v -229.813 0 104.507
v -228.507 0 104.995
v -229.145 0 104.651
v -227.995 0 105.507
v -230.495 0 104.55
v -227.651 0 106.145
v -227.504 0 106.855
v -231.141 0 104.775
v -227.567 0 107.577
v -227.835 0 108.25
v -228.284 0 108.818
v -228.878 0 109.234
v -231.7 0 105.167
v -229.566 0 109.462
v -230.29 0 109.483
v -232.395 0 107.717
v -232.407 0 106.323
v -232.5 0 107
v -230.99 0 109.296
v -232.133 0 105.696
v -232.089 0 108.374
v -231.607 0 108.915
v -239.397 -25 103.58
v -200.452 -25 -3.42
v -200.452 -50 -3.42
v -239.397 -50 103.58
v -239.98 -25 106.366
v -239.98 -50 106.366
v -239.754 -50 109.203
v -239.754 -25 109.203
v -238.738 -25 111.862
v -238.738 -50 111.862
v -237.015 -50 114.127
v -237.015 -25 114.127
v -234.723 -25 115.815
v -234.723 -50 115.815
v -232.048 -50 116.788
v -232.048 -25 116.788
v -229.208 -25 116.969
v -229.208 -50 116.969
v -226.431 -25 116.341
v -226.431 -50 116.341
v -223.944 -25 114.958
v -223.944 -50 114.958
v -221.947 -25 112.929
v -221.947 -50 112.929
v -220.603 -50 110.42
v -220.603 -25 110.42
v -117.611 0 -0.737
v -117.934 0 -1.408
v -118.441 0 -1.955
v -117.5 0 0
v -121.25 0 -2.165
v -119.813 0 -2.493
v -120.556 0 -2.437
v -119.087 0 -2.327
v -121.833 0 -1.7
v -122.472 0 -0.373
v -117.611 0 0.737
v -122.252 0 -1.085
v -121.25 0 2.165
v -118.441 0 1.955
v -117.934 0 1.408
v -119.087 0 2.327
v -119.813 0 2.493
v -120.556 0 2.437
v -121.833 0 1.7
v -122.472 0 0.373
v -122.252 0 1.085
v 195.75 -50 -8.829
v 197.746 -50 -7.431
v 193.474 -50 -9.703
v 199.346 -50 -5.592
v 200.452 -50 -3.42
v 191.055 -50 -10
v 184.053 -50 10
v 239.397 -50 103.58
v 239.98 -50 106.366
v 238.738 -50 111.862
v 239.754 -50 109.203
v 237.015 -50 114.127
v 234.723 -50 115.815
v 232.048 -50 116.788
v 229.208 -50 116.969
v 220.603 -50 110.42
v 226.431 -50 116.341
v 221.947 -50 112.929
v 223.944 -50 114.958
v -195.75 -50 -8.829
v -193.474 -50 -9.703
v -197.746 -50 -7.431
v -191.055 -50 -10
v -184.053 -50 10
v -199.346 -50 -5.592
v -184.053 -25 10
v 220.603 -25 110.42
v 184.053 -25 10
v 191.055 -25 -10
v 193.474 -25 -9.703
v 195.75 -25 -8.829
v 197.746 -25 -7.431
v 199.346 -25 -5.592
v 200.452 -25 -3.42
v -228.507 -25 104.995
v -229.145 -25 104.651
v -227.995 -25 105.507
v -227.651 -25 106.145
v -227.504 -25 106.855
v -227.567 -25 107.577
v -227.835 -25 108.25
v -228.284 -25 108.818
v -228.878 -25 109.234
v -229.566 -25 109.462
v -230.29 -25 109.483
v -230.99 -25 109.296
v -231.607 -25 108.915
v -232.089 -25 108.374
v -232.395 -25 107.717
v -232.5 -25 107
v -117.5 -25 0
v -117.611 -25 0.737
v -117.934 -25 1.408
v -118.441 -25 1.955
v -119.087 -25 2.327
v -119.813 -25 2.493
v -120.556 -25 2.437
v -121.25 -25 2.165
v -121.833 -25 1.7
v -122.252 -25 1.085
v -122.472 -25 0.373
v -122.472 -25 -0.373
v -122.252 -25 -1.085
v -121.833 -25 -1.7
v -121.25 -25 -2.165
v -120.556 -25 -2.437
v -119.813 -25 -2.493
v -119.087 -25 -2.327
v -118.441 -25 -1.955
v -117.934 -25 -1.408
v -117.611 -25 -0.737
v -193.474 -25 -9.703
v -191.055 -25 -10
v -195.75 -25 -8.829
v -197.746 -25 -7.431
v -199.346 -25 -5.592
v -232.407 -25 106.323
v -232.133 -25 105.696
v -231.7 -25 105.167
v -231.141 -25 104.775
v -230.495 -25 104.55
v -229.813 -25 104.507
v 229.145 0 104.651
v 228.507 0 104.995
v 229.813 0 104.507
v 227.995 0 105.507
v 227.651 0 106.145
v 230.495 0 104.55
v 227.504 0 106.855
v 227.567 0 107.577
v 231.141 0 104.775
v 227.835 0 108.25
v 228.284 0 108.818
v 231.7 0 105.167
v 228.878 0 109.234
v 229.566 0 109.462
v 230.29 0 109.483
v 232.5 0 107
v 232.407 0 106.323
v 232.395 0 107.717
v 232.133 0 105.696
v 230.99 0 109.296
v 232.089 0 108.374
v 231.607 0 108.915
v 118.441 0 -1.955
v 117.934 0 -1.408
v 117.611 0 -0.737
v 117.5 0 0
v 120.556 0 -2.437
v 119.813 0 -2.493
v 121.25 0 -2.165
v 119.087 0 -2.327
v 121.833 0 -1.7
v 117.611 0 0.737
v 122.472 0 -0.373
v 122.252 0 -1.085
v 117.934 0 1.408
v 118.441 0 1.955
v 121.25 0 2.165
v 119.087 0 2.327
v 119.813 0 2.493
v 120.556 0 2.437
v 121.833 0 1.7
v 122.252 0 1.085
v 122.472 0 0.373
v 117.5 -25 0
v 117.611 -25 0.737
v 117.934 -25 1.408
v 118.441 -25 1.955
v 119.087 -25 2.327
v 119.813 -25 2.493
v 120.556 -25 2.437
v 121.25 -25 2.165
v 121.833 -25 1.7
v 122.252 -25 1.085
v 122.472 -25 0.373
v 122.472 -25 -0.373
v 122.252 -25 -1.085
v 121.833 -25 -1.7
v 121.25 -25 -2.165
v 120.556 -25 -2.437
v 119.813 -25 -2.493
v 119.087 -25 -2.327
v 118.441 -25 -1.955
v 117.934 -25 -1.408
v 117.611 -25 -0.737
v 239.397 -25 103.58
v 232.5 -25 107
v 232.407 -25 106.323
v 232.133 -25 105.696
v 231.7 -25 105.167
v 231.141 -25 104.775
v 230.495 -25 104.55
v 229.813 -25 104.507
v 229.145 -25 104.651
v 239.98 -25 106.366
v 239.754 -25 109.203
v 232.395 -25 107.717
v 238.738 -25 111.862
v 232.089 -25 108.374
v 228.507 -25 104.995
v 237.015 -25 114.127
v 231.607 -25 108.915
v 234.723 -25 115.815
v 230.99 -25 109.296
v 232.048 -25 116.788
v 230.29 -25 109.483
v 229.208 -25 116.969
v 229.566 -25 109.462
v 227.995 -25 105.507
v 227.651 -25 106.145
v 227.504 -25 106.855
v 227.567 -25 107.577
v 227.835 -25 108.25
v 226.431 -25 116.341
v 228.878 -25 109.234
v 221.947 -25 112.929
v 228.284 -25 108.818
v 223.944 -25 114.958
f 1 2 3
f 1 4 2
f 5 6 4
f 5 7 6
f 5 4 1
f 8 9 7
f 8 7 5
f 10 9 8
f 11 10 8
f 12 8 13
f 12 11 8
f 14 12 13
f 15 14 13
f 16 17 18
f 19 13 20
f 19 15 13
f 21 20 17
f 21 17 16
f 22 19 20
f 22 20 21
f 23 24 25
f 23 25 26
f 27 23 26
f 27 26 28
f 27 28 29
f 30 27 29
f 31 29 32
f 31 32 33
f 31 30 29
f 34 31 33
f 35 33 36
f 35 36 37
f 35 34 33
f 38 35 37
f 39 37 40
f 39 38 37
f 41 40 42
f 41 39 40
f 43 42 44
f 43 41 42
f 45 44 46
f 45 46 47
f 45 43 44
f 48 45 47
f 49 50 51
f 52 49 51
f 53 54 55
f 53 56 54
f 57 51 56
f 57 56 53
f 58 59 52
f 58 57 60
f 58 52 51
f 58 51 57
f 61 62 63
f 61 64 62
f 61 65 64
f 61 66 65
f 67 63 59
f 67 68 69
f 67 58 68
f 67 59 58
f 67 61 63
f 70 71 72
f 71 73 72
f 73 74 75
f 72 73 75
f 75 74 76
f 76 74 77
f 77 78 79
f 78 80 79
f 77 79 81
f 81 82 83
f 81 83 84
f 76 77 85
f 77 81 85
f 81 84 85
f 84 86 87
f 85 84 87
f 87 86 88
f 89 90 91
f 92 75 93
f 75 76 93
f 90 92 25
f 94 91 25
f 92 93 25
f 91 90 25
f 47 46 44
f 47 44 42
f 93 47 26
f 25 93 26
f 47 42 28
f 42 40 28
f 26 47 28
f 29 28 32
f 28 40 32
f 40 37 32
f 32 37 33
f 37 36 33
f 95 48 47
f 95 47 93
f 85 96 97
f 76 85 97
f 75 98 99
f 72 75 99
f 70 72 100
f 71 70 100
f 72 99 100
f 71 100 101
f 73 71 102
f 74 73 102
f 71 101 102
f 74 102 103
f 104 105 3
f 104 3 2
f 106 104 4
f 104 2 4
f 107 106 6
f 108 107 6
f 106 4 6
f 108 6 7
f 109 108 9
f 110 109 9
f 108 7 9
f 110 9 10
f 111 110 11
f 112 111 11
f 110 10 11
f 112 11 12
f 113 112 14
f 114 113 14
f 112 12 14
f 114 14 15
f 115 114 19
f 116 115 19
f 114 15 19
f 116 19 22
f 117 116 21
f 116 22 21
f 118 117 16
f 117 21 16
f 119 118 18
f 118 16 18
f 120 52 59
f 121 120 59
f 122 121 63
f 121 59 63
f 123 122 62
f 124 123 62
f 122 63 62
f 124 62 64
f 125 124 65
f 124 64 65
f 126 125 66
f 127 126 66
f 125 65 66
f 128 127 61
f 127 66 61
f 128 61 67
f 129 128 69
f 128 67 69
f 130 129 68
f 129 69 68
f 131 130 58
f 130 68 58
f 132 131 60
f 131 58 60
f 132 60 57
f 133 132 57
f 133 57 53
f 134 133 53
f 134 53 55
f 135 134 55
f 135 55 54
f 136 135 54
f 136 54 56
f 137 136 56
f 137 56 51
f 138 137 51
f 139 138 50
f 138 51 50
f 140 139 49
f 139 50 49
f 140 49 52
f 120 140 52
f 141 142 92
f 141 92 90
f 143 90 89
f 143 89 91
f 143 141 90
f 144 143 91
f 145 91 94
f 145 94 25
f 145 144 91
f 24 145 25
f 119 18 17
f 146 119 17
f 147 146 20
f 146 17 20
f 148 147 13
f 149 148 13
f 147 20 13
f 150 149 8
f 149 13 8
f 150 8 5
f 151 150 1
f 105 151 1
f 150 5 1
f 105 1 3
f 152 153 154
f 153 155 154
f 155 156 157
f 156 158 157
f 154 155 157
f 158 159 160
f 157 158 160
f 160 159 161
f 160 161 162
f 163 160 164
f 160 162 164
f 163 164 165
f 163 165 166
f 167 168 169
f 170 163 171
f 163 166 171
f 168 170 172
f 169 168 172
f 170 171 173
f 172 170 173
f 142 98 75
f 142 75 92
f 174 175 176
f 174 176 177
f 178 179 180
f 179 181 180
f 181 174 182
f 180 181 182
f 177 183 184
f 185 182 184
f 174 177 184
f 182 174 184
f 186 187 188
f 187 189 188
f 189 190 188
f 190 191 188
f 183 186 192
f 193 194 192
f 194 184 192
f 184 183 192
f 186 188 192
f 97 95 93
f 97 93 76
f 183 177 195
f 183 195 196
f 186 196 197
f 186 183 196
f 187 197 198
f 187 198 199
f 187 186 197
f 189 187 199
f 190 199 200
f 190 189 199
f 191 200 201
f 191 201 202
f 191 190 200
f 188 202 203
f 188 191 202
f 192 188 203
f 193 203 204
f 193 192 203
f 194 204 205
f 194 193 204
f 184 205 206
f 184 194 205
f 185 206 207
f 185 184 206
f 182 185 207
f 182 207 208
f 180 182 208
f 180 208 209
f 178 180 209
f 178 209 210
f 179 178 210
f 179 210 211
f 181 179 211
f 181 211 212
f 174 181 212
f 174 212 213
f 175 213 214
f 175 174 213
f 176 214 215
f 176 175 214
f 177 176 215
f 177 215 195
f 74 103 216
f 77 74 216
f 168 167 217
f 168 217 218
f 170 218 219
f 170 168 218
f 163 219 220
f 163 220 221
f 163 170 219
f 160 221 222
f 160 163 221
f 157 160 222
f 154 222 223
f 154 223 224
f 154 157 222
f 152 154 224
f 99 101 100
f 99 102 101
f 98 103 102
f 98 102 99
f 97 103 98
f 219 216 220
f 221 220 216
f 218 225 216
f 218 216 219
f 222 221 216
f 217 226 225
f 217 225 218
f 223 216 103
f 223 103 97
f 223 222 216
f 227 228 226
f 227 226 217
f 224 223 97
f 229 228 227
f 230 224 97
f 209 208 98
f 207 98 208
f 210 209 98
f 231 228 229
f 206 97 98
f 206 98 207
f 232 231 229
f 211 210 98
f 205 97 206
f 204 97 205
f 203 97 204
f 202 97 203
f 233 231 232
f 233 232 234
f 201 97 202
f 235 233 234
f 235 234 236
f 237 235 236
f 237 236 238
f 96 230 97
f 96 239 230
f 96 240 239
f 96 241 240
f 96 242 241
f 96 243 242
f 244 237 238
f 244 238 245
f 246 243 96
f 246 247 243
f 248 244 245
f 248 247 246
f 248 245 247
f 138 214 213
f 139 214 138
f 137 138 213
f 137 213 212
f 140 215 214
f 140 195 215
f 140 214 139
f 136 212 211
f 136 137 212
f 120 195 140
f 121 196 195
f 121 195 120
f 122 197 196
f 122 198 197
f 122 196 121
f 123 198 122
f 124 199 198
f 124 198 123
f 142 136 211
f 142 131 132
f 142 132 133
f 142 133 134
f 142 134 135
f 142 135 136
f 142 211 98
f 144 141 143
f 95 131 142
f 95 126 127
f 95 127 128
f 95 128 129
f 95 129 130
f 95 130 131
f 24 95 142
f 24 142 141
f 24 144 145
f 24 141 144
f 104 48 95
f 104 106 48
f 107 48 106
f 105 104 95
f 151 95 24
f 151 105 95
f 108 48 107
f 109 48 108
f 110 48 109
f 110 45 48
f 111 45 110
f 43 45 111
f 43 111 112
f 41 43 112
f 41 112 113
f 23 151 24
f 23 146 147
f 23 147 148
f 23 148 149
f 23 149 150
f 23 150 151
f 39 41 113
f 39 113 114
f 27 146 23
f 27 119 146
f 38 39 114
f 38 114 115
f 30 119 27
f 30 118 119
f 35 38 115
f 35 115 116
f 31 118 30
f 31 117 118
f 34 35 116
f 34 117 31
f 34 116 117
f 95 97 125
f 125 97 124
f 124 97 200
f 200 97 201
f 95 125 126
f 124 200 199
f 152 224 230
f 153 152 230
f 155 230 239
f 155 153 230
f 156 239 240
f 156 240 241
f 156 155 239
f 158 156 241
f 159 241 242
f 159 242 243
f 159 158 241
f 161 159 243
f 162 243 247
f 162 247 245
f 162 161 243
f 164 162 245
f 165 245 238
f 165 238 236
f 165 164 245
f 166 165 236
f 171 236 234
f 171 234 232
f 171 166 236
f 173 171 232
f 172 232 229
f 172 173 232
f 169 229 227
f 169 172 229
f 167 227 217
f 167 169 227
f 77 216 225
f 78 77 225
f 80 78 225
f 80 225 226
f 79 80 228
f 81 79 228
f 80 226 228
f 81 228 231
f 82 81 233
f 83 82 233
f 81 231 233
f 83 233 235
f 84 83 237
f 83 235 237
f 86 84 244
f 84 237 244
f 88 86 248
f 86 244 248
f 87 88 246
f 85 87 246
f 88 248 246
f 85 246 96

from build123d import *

# Parameters (mm, degrees)
F1_DEPTH = 50
F2_DEPTH = 25


with BuildPart() as f1:
    # F0 (on Front) → F1 (new body)
    with BuildSketch(Plane.XZ):
        with BuildLine():
            ThreePointArc((191.0551849335, -10), (183.9841171217, -7.0710678119), (181.0551849335, 0))
            ThreePointArc((181.0551849335, 0), (181.2071074034, 1.7364817767), (181.6582587257, 3.4202014333))
            Line((181.6582587257, 3.4202014333), (184.0531095514, 10))
            Line((184.0531095514, 10), (0, 10))
            ThreePointArc((0, 10), (-10, 0), (0, -10))
            Line((0, -10), (191.0551849335, -10))
        make_face()
        with BuildLine():
            ThreePointArc((122.5, 0), (120, -2.5), (117.5, 0))
            ThreePointArc((117.5, 0), (120, 2.5), (122.5, 0))
        make_face(mode=Mode.SUBTRACT)
        with BuildLine():
            Line((191.0551849335, 0), (181.0551849335, 0))
            ThreePointArc((181.0551849335, 0), (183.9841171217, -7.0710678119), (191.0551849335, -10))
            ThreePointArc((191.0551849335, -10), (196.790949297, -8.1915204429), (200.4521111414, -3.4202014333))
            ThreePointArc((200.4521111414, -3.4202014333), (200.1182628039, 4.2261826174), (194.4753863668, 9.3969262079))
            Line((194.4753863668, 9.3969262079), (191.0551849335, 0))
        make_face()
        with BuildLine():
            ThreePointArc((191.0551849335, 10), (192.7916667102, 9.8480775301), (194.4753863668, 9.3969262079))
            ThreePointArc((194.4753863668, 9.3969262079), (200.1182628039, 4.2261826174), (200.4521111414, -3.4202014333))
            Line((200.4521111414, -3.4202014333), (239.3969262079, 103.5797985667))
            ThreePointArc((239.3969262079, 103.5797985667), (233.4202014333, 116.3969262079), (220.6030737921, 110.4202014333))
            Line((220.6030737921, 110.4202014333), (184.0531095514, 10))
            Line((184.0531095514, 10), (191.0551849335, 10))
        make_face()
        with BuildLine():
            ThreePointArc((232.5, 107), (231.4339410909, 104.9521198893), (229.1449496417, 104.650768448))
            ThreePointArc((229.1449496417, 104.650768448), (228.5660589091, 109.0478801107), (232.5, 107))
        make_face(mode=Mode.SUBTRACT)
        with BuildLine():
            ThreePointArc((181.6582587257, 3.4202014333), (181.2071074034, 1.7364817767), (181.0551849335, 0))
            Line((181.0551849335, 0), (191.0551849335, 0))
            Line((191.0551849335, 0), (194.4753863668, 9.3969262079))
            ThreePointArc((194.4753863668, 9.3969262079), (192.7916667102, 9.8480775301), (191.0551849335, 10))
            Line((191.0551849335, 10), (184.0531095514, 10))
            Line((184.0531095514, 10), (181.6582587257, 3.4202014333))
        make_face()
        with BuildLine():
            ThreePointArc((232.5, 107), (228.5660589091, 109.0478801107), (229.1449496417, 104.650768448))
            ThreePointArc((229.1449496417, 104.650768448), (231.4339410909, 104.9521198893), (232.5, 107))
        make_face()
        with BuildLine():
            Line((122.5, 0), (117.5, 0))
            ThreePointArc((117.5, 0), (120, -2.5), (122.5, 0))
        make_face()
        with BuildLine():
            ThreePointArc((122.5, 0), (120, 2.5), (117.5, 0))
            Line((117.5, 0), (122.5, 0))
        make_face()
    extrude(amount=F1_DEPTH)

    # F0 (on Front) → F2 (cut)
    with BuildSketch(Plane.XZ):
        with BuildLine():
            ThreePointArc((191.0551849335, -10), (183.9841171217, -7.0710678119), (181.0551849335, 0))
            ThreePointArc((181.0551849335, 0), (181.2071074034, 1.7364817767), (181.6582587257, 3.4202014333))
            Line((181.6582587257, 3.4202014333), (184.0531095514, 10))
            Line((184.0531095514, 10), (0, 10))
            ThreePointArc((0, 10), (-10, 0), (0, -10))
            Line((0, -10), (191.0551849335, -10))
        make_face()
        with BuildLine():
            ThreePointArc((122.5, 0), (120, -2.5), (117.5, 0))
            ThreePointArc((117.5, 0), (120, 2.5), (122.5, 0))
        make_face(mode=Mode.SUBTRACT)
        with BuildLine():
            ThreePointArc((181.6582587257, 3.4202014333), (181.2071074034, 1.7364817767), (181.0551849335, 0))
            Line((181.0551849335, 0), (191.0551849335, 0))
            Line((191.0551849335, 0), (194.4753863668, 9.3969262079))
            ThreePointArc((194.4753863668, 9.3969262079), (192.7916667102, 9.8480775301), (191.0551849335, 10))
            Line((191.0551849335, 10), (184.0531095514, 10))
            Line((184.0531095514, 10), (181.6582587257, 3.4202014333))
        make_face()
        with BuildLine():
            Line((191.0551849335, 0), (181.0551849335, 0))
            ThreePointArc((181.0551849335, 0), (183.9841171217, -7.0710678119), (191.0551849335, -10))
            ThreePointArc((191.0551849335, -10), (196.790949297, -8.1915204429), (200.4521111414, -3.4202014333))
            ThreePointArc((200.4521111414, -3.4202014333), (200.1182628039, 4.2261826174), (194.4753863668, 9.3969262079))
            Line((194.4753863668, 9.3969262079), (191.0551849335, 0))
        make_face()
        with BuildLine():
            ThreePointArc((191.0551849335, 10), (192.7916667102, 9.8480775301), (194.4753863668, 9.3969262079))
            ThreePointArc((194.4753863668, 9.3969262079), (200.1182628039, 4.2261826174), (200.4521111414, -3.4202014333))
            Line((200.4521111414, -3.4202014333), (239.3969262079, 103.5797985667))
            ThreePointArc((239.3969262079, 103.5797985667), (233.4202014333, 116.3969262079), (220.6030737921, 110.4202014333))
            Line((220.6030737921, 110.4202014333), (184.0531095514, 10))
            Line((184.0531095514, 10), (191.0551849335, 10))
        make_face()
        with BuildLine():
            ThreePointArc((232.5, 107), (231.4339410909, 104.9521198893), (229.1449496417, 104.650768448))
            ThreePointArc((229.1449496417, 104.650768448), (228.5660589091, 109.0478801107), (232.5, 107))
        make_face(mode=Mode.SUBTRACT)
    extrude(amount=F2_DEPTH, mode=Mode.SUBTRACT)

    # F3: F1 across plane


with BuildPart() as f1_1:
    add(f1.part)
    add(f1.part.mirror(Plane.YZ))


with BuildPart() as f4_1:
    # F4: copy of F1
    add(f1_1.part)


solid = f1_1.part
